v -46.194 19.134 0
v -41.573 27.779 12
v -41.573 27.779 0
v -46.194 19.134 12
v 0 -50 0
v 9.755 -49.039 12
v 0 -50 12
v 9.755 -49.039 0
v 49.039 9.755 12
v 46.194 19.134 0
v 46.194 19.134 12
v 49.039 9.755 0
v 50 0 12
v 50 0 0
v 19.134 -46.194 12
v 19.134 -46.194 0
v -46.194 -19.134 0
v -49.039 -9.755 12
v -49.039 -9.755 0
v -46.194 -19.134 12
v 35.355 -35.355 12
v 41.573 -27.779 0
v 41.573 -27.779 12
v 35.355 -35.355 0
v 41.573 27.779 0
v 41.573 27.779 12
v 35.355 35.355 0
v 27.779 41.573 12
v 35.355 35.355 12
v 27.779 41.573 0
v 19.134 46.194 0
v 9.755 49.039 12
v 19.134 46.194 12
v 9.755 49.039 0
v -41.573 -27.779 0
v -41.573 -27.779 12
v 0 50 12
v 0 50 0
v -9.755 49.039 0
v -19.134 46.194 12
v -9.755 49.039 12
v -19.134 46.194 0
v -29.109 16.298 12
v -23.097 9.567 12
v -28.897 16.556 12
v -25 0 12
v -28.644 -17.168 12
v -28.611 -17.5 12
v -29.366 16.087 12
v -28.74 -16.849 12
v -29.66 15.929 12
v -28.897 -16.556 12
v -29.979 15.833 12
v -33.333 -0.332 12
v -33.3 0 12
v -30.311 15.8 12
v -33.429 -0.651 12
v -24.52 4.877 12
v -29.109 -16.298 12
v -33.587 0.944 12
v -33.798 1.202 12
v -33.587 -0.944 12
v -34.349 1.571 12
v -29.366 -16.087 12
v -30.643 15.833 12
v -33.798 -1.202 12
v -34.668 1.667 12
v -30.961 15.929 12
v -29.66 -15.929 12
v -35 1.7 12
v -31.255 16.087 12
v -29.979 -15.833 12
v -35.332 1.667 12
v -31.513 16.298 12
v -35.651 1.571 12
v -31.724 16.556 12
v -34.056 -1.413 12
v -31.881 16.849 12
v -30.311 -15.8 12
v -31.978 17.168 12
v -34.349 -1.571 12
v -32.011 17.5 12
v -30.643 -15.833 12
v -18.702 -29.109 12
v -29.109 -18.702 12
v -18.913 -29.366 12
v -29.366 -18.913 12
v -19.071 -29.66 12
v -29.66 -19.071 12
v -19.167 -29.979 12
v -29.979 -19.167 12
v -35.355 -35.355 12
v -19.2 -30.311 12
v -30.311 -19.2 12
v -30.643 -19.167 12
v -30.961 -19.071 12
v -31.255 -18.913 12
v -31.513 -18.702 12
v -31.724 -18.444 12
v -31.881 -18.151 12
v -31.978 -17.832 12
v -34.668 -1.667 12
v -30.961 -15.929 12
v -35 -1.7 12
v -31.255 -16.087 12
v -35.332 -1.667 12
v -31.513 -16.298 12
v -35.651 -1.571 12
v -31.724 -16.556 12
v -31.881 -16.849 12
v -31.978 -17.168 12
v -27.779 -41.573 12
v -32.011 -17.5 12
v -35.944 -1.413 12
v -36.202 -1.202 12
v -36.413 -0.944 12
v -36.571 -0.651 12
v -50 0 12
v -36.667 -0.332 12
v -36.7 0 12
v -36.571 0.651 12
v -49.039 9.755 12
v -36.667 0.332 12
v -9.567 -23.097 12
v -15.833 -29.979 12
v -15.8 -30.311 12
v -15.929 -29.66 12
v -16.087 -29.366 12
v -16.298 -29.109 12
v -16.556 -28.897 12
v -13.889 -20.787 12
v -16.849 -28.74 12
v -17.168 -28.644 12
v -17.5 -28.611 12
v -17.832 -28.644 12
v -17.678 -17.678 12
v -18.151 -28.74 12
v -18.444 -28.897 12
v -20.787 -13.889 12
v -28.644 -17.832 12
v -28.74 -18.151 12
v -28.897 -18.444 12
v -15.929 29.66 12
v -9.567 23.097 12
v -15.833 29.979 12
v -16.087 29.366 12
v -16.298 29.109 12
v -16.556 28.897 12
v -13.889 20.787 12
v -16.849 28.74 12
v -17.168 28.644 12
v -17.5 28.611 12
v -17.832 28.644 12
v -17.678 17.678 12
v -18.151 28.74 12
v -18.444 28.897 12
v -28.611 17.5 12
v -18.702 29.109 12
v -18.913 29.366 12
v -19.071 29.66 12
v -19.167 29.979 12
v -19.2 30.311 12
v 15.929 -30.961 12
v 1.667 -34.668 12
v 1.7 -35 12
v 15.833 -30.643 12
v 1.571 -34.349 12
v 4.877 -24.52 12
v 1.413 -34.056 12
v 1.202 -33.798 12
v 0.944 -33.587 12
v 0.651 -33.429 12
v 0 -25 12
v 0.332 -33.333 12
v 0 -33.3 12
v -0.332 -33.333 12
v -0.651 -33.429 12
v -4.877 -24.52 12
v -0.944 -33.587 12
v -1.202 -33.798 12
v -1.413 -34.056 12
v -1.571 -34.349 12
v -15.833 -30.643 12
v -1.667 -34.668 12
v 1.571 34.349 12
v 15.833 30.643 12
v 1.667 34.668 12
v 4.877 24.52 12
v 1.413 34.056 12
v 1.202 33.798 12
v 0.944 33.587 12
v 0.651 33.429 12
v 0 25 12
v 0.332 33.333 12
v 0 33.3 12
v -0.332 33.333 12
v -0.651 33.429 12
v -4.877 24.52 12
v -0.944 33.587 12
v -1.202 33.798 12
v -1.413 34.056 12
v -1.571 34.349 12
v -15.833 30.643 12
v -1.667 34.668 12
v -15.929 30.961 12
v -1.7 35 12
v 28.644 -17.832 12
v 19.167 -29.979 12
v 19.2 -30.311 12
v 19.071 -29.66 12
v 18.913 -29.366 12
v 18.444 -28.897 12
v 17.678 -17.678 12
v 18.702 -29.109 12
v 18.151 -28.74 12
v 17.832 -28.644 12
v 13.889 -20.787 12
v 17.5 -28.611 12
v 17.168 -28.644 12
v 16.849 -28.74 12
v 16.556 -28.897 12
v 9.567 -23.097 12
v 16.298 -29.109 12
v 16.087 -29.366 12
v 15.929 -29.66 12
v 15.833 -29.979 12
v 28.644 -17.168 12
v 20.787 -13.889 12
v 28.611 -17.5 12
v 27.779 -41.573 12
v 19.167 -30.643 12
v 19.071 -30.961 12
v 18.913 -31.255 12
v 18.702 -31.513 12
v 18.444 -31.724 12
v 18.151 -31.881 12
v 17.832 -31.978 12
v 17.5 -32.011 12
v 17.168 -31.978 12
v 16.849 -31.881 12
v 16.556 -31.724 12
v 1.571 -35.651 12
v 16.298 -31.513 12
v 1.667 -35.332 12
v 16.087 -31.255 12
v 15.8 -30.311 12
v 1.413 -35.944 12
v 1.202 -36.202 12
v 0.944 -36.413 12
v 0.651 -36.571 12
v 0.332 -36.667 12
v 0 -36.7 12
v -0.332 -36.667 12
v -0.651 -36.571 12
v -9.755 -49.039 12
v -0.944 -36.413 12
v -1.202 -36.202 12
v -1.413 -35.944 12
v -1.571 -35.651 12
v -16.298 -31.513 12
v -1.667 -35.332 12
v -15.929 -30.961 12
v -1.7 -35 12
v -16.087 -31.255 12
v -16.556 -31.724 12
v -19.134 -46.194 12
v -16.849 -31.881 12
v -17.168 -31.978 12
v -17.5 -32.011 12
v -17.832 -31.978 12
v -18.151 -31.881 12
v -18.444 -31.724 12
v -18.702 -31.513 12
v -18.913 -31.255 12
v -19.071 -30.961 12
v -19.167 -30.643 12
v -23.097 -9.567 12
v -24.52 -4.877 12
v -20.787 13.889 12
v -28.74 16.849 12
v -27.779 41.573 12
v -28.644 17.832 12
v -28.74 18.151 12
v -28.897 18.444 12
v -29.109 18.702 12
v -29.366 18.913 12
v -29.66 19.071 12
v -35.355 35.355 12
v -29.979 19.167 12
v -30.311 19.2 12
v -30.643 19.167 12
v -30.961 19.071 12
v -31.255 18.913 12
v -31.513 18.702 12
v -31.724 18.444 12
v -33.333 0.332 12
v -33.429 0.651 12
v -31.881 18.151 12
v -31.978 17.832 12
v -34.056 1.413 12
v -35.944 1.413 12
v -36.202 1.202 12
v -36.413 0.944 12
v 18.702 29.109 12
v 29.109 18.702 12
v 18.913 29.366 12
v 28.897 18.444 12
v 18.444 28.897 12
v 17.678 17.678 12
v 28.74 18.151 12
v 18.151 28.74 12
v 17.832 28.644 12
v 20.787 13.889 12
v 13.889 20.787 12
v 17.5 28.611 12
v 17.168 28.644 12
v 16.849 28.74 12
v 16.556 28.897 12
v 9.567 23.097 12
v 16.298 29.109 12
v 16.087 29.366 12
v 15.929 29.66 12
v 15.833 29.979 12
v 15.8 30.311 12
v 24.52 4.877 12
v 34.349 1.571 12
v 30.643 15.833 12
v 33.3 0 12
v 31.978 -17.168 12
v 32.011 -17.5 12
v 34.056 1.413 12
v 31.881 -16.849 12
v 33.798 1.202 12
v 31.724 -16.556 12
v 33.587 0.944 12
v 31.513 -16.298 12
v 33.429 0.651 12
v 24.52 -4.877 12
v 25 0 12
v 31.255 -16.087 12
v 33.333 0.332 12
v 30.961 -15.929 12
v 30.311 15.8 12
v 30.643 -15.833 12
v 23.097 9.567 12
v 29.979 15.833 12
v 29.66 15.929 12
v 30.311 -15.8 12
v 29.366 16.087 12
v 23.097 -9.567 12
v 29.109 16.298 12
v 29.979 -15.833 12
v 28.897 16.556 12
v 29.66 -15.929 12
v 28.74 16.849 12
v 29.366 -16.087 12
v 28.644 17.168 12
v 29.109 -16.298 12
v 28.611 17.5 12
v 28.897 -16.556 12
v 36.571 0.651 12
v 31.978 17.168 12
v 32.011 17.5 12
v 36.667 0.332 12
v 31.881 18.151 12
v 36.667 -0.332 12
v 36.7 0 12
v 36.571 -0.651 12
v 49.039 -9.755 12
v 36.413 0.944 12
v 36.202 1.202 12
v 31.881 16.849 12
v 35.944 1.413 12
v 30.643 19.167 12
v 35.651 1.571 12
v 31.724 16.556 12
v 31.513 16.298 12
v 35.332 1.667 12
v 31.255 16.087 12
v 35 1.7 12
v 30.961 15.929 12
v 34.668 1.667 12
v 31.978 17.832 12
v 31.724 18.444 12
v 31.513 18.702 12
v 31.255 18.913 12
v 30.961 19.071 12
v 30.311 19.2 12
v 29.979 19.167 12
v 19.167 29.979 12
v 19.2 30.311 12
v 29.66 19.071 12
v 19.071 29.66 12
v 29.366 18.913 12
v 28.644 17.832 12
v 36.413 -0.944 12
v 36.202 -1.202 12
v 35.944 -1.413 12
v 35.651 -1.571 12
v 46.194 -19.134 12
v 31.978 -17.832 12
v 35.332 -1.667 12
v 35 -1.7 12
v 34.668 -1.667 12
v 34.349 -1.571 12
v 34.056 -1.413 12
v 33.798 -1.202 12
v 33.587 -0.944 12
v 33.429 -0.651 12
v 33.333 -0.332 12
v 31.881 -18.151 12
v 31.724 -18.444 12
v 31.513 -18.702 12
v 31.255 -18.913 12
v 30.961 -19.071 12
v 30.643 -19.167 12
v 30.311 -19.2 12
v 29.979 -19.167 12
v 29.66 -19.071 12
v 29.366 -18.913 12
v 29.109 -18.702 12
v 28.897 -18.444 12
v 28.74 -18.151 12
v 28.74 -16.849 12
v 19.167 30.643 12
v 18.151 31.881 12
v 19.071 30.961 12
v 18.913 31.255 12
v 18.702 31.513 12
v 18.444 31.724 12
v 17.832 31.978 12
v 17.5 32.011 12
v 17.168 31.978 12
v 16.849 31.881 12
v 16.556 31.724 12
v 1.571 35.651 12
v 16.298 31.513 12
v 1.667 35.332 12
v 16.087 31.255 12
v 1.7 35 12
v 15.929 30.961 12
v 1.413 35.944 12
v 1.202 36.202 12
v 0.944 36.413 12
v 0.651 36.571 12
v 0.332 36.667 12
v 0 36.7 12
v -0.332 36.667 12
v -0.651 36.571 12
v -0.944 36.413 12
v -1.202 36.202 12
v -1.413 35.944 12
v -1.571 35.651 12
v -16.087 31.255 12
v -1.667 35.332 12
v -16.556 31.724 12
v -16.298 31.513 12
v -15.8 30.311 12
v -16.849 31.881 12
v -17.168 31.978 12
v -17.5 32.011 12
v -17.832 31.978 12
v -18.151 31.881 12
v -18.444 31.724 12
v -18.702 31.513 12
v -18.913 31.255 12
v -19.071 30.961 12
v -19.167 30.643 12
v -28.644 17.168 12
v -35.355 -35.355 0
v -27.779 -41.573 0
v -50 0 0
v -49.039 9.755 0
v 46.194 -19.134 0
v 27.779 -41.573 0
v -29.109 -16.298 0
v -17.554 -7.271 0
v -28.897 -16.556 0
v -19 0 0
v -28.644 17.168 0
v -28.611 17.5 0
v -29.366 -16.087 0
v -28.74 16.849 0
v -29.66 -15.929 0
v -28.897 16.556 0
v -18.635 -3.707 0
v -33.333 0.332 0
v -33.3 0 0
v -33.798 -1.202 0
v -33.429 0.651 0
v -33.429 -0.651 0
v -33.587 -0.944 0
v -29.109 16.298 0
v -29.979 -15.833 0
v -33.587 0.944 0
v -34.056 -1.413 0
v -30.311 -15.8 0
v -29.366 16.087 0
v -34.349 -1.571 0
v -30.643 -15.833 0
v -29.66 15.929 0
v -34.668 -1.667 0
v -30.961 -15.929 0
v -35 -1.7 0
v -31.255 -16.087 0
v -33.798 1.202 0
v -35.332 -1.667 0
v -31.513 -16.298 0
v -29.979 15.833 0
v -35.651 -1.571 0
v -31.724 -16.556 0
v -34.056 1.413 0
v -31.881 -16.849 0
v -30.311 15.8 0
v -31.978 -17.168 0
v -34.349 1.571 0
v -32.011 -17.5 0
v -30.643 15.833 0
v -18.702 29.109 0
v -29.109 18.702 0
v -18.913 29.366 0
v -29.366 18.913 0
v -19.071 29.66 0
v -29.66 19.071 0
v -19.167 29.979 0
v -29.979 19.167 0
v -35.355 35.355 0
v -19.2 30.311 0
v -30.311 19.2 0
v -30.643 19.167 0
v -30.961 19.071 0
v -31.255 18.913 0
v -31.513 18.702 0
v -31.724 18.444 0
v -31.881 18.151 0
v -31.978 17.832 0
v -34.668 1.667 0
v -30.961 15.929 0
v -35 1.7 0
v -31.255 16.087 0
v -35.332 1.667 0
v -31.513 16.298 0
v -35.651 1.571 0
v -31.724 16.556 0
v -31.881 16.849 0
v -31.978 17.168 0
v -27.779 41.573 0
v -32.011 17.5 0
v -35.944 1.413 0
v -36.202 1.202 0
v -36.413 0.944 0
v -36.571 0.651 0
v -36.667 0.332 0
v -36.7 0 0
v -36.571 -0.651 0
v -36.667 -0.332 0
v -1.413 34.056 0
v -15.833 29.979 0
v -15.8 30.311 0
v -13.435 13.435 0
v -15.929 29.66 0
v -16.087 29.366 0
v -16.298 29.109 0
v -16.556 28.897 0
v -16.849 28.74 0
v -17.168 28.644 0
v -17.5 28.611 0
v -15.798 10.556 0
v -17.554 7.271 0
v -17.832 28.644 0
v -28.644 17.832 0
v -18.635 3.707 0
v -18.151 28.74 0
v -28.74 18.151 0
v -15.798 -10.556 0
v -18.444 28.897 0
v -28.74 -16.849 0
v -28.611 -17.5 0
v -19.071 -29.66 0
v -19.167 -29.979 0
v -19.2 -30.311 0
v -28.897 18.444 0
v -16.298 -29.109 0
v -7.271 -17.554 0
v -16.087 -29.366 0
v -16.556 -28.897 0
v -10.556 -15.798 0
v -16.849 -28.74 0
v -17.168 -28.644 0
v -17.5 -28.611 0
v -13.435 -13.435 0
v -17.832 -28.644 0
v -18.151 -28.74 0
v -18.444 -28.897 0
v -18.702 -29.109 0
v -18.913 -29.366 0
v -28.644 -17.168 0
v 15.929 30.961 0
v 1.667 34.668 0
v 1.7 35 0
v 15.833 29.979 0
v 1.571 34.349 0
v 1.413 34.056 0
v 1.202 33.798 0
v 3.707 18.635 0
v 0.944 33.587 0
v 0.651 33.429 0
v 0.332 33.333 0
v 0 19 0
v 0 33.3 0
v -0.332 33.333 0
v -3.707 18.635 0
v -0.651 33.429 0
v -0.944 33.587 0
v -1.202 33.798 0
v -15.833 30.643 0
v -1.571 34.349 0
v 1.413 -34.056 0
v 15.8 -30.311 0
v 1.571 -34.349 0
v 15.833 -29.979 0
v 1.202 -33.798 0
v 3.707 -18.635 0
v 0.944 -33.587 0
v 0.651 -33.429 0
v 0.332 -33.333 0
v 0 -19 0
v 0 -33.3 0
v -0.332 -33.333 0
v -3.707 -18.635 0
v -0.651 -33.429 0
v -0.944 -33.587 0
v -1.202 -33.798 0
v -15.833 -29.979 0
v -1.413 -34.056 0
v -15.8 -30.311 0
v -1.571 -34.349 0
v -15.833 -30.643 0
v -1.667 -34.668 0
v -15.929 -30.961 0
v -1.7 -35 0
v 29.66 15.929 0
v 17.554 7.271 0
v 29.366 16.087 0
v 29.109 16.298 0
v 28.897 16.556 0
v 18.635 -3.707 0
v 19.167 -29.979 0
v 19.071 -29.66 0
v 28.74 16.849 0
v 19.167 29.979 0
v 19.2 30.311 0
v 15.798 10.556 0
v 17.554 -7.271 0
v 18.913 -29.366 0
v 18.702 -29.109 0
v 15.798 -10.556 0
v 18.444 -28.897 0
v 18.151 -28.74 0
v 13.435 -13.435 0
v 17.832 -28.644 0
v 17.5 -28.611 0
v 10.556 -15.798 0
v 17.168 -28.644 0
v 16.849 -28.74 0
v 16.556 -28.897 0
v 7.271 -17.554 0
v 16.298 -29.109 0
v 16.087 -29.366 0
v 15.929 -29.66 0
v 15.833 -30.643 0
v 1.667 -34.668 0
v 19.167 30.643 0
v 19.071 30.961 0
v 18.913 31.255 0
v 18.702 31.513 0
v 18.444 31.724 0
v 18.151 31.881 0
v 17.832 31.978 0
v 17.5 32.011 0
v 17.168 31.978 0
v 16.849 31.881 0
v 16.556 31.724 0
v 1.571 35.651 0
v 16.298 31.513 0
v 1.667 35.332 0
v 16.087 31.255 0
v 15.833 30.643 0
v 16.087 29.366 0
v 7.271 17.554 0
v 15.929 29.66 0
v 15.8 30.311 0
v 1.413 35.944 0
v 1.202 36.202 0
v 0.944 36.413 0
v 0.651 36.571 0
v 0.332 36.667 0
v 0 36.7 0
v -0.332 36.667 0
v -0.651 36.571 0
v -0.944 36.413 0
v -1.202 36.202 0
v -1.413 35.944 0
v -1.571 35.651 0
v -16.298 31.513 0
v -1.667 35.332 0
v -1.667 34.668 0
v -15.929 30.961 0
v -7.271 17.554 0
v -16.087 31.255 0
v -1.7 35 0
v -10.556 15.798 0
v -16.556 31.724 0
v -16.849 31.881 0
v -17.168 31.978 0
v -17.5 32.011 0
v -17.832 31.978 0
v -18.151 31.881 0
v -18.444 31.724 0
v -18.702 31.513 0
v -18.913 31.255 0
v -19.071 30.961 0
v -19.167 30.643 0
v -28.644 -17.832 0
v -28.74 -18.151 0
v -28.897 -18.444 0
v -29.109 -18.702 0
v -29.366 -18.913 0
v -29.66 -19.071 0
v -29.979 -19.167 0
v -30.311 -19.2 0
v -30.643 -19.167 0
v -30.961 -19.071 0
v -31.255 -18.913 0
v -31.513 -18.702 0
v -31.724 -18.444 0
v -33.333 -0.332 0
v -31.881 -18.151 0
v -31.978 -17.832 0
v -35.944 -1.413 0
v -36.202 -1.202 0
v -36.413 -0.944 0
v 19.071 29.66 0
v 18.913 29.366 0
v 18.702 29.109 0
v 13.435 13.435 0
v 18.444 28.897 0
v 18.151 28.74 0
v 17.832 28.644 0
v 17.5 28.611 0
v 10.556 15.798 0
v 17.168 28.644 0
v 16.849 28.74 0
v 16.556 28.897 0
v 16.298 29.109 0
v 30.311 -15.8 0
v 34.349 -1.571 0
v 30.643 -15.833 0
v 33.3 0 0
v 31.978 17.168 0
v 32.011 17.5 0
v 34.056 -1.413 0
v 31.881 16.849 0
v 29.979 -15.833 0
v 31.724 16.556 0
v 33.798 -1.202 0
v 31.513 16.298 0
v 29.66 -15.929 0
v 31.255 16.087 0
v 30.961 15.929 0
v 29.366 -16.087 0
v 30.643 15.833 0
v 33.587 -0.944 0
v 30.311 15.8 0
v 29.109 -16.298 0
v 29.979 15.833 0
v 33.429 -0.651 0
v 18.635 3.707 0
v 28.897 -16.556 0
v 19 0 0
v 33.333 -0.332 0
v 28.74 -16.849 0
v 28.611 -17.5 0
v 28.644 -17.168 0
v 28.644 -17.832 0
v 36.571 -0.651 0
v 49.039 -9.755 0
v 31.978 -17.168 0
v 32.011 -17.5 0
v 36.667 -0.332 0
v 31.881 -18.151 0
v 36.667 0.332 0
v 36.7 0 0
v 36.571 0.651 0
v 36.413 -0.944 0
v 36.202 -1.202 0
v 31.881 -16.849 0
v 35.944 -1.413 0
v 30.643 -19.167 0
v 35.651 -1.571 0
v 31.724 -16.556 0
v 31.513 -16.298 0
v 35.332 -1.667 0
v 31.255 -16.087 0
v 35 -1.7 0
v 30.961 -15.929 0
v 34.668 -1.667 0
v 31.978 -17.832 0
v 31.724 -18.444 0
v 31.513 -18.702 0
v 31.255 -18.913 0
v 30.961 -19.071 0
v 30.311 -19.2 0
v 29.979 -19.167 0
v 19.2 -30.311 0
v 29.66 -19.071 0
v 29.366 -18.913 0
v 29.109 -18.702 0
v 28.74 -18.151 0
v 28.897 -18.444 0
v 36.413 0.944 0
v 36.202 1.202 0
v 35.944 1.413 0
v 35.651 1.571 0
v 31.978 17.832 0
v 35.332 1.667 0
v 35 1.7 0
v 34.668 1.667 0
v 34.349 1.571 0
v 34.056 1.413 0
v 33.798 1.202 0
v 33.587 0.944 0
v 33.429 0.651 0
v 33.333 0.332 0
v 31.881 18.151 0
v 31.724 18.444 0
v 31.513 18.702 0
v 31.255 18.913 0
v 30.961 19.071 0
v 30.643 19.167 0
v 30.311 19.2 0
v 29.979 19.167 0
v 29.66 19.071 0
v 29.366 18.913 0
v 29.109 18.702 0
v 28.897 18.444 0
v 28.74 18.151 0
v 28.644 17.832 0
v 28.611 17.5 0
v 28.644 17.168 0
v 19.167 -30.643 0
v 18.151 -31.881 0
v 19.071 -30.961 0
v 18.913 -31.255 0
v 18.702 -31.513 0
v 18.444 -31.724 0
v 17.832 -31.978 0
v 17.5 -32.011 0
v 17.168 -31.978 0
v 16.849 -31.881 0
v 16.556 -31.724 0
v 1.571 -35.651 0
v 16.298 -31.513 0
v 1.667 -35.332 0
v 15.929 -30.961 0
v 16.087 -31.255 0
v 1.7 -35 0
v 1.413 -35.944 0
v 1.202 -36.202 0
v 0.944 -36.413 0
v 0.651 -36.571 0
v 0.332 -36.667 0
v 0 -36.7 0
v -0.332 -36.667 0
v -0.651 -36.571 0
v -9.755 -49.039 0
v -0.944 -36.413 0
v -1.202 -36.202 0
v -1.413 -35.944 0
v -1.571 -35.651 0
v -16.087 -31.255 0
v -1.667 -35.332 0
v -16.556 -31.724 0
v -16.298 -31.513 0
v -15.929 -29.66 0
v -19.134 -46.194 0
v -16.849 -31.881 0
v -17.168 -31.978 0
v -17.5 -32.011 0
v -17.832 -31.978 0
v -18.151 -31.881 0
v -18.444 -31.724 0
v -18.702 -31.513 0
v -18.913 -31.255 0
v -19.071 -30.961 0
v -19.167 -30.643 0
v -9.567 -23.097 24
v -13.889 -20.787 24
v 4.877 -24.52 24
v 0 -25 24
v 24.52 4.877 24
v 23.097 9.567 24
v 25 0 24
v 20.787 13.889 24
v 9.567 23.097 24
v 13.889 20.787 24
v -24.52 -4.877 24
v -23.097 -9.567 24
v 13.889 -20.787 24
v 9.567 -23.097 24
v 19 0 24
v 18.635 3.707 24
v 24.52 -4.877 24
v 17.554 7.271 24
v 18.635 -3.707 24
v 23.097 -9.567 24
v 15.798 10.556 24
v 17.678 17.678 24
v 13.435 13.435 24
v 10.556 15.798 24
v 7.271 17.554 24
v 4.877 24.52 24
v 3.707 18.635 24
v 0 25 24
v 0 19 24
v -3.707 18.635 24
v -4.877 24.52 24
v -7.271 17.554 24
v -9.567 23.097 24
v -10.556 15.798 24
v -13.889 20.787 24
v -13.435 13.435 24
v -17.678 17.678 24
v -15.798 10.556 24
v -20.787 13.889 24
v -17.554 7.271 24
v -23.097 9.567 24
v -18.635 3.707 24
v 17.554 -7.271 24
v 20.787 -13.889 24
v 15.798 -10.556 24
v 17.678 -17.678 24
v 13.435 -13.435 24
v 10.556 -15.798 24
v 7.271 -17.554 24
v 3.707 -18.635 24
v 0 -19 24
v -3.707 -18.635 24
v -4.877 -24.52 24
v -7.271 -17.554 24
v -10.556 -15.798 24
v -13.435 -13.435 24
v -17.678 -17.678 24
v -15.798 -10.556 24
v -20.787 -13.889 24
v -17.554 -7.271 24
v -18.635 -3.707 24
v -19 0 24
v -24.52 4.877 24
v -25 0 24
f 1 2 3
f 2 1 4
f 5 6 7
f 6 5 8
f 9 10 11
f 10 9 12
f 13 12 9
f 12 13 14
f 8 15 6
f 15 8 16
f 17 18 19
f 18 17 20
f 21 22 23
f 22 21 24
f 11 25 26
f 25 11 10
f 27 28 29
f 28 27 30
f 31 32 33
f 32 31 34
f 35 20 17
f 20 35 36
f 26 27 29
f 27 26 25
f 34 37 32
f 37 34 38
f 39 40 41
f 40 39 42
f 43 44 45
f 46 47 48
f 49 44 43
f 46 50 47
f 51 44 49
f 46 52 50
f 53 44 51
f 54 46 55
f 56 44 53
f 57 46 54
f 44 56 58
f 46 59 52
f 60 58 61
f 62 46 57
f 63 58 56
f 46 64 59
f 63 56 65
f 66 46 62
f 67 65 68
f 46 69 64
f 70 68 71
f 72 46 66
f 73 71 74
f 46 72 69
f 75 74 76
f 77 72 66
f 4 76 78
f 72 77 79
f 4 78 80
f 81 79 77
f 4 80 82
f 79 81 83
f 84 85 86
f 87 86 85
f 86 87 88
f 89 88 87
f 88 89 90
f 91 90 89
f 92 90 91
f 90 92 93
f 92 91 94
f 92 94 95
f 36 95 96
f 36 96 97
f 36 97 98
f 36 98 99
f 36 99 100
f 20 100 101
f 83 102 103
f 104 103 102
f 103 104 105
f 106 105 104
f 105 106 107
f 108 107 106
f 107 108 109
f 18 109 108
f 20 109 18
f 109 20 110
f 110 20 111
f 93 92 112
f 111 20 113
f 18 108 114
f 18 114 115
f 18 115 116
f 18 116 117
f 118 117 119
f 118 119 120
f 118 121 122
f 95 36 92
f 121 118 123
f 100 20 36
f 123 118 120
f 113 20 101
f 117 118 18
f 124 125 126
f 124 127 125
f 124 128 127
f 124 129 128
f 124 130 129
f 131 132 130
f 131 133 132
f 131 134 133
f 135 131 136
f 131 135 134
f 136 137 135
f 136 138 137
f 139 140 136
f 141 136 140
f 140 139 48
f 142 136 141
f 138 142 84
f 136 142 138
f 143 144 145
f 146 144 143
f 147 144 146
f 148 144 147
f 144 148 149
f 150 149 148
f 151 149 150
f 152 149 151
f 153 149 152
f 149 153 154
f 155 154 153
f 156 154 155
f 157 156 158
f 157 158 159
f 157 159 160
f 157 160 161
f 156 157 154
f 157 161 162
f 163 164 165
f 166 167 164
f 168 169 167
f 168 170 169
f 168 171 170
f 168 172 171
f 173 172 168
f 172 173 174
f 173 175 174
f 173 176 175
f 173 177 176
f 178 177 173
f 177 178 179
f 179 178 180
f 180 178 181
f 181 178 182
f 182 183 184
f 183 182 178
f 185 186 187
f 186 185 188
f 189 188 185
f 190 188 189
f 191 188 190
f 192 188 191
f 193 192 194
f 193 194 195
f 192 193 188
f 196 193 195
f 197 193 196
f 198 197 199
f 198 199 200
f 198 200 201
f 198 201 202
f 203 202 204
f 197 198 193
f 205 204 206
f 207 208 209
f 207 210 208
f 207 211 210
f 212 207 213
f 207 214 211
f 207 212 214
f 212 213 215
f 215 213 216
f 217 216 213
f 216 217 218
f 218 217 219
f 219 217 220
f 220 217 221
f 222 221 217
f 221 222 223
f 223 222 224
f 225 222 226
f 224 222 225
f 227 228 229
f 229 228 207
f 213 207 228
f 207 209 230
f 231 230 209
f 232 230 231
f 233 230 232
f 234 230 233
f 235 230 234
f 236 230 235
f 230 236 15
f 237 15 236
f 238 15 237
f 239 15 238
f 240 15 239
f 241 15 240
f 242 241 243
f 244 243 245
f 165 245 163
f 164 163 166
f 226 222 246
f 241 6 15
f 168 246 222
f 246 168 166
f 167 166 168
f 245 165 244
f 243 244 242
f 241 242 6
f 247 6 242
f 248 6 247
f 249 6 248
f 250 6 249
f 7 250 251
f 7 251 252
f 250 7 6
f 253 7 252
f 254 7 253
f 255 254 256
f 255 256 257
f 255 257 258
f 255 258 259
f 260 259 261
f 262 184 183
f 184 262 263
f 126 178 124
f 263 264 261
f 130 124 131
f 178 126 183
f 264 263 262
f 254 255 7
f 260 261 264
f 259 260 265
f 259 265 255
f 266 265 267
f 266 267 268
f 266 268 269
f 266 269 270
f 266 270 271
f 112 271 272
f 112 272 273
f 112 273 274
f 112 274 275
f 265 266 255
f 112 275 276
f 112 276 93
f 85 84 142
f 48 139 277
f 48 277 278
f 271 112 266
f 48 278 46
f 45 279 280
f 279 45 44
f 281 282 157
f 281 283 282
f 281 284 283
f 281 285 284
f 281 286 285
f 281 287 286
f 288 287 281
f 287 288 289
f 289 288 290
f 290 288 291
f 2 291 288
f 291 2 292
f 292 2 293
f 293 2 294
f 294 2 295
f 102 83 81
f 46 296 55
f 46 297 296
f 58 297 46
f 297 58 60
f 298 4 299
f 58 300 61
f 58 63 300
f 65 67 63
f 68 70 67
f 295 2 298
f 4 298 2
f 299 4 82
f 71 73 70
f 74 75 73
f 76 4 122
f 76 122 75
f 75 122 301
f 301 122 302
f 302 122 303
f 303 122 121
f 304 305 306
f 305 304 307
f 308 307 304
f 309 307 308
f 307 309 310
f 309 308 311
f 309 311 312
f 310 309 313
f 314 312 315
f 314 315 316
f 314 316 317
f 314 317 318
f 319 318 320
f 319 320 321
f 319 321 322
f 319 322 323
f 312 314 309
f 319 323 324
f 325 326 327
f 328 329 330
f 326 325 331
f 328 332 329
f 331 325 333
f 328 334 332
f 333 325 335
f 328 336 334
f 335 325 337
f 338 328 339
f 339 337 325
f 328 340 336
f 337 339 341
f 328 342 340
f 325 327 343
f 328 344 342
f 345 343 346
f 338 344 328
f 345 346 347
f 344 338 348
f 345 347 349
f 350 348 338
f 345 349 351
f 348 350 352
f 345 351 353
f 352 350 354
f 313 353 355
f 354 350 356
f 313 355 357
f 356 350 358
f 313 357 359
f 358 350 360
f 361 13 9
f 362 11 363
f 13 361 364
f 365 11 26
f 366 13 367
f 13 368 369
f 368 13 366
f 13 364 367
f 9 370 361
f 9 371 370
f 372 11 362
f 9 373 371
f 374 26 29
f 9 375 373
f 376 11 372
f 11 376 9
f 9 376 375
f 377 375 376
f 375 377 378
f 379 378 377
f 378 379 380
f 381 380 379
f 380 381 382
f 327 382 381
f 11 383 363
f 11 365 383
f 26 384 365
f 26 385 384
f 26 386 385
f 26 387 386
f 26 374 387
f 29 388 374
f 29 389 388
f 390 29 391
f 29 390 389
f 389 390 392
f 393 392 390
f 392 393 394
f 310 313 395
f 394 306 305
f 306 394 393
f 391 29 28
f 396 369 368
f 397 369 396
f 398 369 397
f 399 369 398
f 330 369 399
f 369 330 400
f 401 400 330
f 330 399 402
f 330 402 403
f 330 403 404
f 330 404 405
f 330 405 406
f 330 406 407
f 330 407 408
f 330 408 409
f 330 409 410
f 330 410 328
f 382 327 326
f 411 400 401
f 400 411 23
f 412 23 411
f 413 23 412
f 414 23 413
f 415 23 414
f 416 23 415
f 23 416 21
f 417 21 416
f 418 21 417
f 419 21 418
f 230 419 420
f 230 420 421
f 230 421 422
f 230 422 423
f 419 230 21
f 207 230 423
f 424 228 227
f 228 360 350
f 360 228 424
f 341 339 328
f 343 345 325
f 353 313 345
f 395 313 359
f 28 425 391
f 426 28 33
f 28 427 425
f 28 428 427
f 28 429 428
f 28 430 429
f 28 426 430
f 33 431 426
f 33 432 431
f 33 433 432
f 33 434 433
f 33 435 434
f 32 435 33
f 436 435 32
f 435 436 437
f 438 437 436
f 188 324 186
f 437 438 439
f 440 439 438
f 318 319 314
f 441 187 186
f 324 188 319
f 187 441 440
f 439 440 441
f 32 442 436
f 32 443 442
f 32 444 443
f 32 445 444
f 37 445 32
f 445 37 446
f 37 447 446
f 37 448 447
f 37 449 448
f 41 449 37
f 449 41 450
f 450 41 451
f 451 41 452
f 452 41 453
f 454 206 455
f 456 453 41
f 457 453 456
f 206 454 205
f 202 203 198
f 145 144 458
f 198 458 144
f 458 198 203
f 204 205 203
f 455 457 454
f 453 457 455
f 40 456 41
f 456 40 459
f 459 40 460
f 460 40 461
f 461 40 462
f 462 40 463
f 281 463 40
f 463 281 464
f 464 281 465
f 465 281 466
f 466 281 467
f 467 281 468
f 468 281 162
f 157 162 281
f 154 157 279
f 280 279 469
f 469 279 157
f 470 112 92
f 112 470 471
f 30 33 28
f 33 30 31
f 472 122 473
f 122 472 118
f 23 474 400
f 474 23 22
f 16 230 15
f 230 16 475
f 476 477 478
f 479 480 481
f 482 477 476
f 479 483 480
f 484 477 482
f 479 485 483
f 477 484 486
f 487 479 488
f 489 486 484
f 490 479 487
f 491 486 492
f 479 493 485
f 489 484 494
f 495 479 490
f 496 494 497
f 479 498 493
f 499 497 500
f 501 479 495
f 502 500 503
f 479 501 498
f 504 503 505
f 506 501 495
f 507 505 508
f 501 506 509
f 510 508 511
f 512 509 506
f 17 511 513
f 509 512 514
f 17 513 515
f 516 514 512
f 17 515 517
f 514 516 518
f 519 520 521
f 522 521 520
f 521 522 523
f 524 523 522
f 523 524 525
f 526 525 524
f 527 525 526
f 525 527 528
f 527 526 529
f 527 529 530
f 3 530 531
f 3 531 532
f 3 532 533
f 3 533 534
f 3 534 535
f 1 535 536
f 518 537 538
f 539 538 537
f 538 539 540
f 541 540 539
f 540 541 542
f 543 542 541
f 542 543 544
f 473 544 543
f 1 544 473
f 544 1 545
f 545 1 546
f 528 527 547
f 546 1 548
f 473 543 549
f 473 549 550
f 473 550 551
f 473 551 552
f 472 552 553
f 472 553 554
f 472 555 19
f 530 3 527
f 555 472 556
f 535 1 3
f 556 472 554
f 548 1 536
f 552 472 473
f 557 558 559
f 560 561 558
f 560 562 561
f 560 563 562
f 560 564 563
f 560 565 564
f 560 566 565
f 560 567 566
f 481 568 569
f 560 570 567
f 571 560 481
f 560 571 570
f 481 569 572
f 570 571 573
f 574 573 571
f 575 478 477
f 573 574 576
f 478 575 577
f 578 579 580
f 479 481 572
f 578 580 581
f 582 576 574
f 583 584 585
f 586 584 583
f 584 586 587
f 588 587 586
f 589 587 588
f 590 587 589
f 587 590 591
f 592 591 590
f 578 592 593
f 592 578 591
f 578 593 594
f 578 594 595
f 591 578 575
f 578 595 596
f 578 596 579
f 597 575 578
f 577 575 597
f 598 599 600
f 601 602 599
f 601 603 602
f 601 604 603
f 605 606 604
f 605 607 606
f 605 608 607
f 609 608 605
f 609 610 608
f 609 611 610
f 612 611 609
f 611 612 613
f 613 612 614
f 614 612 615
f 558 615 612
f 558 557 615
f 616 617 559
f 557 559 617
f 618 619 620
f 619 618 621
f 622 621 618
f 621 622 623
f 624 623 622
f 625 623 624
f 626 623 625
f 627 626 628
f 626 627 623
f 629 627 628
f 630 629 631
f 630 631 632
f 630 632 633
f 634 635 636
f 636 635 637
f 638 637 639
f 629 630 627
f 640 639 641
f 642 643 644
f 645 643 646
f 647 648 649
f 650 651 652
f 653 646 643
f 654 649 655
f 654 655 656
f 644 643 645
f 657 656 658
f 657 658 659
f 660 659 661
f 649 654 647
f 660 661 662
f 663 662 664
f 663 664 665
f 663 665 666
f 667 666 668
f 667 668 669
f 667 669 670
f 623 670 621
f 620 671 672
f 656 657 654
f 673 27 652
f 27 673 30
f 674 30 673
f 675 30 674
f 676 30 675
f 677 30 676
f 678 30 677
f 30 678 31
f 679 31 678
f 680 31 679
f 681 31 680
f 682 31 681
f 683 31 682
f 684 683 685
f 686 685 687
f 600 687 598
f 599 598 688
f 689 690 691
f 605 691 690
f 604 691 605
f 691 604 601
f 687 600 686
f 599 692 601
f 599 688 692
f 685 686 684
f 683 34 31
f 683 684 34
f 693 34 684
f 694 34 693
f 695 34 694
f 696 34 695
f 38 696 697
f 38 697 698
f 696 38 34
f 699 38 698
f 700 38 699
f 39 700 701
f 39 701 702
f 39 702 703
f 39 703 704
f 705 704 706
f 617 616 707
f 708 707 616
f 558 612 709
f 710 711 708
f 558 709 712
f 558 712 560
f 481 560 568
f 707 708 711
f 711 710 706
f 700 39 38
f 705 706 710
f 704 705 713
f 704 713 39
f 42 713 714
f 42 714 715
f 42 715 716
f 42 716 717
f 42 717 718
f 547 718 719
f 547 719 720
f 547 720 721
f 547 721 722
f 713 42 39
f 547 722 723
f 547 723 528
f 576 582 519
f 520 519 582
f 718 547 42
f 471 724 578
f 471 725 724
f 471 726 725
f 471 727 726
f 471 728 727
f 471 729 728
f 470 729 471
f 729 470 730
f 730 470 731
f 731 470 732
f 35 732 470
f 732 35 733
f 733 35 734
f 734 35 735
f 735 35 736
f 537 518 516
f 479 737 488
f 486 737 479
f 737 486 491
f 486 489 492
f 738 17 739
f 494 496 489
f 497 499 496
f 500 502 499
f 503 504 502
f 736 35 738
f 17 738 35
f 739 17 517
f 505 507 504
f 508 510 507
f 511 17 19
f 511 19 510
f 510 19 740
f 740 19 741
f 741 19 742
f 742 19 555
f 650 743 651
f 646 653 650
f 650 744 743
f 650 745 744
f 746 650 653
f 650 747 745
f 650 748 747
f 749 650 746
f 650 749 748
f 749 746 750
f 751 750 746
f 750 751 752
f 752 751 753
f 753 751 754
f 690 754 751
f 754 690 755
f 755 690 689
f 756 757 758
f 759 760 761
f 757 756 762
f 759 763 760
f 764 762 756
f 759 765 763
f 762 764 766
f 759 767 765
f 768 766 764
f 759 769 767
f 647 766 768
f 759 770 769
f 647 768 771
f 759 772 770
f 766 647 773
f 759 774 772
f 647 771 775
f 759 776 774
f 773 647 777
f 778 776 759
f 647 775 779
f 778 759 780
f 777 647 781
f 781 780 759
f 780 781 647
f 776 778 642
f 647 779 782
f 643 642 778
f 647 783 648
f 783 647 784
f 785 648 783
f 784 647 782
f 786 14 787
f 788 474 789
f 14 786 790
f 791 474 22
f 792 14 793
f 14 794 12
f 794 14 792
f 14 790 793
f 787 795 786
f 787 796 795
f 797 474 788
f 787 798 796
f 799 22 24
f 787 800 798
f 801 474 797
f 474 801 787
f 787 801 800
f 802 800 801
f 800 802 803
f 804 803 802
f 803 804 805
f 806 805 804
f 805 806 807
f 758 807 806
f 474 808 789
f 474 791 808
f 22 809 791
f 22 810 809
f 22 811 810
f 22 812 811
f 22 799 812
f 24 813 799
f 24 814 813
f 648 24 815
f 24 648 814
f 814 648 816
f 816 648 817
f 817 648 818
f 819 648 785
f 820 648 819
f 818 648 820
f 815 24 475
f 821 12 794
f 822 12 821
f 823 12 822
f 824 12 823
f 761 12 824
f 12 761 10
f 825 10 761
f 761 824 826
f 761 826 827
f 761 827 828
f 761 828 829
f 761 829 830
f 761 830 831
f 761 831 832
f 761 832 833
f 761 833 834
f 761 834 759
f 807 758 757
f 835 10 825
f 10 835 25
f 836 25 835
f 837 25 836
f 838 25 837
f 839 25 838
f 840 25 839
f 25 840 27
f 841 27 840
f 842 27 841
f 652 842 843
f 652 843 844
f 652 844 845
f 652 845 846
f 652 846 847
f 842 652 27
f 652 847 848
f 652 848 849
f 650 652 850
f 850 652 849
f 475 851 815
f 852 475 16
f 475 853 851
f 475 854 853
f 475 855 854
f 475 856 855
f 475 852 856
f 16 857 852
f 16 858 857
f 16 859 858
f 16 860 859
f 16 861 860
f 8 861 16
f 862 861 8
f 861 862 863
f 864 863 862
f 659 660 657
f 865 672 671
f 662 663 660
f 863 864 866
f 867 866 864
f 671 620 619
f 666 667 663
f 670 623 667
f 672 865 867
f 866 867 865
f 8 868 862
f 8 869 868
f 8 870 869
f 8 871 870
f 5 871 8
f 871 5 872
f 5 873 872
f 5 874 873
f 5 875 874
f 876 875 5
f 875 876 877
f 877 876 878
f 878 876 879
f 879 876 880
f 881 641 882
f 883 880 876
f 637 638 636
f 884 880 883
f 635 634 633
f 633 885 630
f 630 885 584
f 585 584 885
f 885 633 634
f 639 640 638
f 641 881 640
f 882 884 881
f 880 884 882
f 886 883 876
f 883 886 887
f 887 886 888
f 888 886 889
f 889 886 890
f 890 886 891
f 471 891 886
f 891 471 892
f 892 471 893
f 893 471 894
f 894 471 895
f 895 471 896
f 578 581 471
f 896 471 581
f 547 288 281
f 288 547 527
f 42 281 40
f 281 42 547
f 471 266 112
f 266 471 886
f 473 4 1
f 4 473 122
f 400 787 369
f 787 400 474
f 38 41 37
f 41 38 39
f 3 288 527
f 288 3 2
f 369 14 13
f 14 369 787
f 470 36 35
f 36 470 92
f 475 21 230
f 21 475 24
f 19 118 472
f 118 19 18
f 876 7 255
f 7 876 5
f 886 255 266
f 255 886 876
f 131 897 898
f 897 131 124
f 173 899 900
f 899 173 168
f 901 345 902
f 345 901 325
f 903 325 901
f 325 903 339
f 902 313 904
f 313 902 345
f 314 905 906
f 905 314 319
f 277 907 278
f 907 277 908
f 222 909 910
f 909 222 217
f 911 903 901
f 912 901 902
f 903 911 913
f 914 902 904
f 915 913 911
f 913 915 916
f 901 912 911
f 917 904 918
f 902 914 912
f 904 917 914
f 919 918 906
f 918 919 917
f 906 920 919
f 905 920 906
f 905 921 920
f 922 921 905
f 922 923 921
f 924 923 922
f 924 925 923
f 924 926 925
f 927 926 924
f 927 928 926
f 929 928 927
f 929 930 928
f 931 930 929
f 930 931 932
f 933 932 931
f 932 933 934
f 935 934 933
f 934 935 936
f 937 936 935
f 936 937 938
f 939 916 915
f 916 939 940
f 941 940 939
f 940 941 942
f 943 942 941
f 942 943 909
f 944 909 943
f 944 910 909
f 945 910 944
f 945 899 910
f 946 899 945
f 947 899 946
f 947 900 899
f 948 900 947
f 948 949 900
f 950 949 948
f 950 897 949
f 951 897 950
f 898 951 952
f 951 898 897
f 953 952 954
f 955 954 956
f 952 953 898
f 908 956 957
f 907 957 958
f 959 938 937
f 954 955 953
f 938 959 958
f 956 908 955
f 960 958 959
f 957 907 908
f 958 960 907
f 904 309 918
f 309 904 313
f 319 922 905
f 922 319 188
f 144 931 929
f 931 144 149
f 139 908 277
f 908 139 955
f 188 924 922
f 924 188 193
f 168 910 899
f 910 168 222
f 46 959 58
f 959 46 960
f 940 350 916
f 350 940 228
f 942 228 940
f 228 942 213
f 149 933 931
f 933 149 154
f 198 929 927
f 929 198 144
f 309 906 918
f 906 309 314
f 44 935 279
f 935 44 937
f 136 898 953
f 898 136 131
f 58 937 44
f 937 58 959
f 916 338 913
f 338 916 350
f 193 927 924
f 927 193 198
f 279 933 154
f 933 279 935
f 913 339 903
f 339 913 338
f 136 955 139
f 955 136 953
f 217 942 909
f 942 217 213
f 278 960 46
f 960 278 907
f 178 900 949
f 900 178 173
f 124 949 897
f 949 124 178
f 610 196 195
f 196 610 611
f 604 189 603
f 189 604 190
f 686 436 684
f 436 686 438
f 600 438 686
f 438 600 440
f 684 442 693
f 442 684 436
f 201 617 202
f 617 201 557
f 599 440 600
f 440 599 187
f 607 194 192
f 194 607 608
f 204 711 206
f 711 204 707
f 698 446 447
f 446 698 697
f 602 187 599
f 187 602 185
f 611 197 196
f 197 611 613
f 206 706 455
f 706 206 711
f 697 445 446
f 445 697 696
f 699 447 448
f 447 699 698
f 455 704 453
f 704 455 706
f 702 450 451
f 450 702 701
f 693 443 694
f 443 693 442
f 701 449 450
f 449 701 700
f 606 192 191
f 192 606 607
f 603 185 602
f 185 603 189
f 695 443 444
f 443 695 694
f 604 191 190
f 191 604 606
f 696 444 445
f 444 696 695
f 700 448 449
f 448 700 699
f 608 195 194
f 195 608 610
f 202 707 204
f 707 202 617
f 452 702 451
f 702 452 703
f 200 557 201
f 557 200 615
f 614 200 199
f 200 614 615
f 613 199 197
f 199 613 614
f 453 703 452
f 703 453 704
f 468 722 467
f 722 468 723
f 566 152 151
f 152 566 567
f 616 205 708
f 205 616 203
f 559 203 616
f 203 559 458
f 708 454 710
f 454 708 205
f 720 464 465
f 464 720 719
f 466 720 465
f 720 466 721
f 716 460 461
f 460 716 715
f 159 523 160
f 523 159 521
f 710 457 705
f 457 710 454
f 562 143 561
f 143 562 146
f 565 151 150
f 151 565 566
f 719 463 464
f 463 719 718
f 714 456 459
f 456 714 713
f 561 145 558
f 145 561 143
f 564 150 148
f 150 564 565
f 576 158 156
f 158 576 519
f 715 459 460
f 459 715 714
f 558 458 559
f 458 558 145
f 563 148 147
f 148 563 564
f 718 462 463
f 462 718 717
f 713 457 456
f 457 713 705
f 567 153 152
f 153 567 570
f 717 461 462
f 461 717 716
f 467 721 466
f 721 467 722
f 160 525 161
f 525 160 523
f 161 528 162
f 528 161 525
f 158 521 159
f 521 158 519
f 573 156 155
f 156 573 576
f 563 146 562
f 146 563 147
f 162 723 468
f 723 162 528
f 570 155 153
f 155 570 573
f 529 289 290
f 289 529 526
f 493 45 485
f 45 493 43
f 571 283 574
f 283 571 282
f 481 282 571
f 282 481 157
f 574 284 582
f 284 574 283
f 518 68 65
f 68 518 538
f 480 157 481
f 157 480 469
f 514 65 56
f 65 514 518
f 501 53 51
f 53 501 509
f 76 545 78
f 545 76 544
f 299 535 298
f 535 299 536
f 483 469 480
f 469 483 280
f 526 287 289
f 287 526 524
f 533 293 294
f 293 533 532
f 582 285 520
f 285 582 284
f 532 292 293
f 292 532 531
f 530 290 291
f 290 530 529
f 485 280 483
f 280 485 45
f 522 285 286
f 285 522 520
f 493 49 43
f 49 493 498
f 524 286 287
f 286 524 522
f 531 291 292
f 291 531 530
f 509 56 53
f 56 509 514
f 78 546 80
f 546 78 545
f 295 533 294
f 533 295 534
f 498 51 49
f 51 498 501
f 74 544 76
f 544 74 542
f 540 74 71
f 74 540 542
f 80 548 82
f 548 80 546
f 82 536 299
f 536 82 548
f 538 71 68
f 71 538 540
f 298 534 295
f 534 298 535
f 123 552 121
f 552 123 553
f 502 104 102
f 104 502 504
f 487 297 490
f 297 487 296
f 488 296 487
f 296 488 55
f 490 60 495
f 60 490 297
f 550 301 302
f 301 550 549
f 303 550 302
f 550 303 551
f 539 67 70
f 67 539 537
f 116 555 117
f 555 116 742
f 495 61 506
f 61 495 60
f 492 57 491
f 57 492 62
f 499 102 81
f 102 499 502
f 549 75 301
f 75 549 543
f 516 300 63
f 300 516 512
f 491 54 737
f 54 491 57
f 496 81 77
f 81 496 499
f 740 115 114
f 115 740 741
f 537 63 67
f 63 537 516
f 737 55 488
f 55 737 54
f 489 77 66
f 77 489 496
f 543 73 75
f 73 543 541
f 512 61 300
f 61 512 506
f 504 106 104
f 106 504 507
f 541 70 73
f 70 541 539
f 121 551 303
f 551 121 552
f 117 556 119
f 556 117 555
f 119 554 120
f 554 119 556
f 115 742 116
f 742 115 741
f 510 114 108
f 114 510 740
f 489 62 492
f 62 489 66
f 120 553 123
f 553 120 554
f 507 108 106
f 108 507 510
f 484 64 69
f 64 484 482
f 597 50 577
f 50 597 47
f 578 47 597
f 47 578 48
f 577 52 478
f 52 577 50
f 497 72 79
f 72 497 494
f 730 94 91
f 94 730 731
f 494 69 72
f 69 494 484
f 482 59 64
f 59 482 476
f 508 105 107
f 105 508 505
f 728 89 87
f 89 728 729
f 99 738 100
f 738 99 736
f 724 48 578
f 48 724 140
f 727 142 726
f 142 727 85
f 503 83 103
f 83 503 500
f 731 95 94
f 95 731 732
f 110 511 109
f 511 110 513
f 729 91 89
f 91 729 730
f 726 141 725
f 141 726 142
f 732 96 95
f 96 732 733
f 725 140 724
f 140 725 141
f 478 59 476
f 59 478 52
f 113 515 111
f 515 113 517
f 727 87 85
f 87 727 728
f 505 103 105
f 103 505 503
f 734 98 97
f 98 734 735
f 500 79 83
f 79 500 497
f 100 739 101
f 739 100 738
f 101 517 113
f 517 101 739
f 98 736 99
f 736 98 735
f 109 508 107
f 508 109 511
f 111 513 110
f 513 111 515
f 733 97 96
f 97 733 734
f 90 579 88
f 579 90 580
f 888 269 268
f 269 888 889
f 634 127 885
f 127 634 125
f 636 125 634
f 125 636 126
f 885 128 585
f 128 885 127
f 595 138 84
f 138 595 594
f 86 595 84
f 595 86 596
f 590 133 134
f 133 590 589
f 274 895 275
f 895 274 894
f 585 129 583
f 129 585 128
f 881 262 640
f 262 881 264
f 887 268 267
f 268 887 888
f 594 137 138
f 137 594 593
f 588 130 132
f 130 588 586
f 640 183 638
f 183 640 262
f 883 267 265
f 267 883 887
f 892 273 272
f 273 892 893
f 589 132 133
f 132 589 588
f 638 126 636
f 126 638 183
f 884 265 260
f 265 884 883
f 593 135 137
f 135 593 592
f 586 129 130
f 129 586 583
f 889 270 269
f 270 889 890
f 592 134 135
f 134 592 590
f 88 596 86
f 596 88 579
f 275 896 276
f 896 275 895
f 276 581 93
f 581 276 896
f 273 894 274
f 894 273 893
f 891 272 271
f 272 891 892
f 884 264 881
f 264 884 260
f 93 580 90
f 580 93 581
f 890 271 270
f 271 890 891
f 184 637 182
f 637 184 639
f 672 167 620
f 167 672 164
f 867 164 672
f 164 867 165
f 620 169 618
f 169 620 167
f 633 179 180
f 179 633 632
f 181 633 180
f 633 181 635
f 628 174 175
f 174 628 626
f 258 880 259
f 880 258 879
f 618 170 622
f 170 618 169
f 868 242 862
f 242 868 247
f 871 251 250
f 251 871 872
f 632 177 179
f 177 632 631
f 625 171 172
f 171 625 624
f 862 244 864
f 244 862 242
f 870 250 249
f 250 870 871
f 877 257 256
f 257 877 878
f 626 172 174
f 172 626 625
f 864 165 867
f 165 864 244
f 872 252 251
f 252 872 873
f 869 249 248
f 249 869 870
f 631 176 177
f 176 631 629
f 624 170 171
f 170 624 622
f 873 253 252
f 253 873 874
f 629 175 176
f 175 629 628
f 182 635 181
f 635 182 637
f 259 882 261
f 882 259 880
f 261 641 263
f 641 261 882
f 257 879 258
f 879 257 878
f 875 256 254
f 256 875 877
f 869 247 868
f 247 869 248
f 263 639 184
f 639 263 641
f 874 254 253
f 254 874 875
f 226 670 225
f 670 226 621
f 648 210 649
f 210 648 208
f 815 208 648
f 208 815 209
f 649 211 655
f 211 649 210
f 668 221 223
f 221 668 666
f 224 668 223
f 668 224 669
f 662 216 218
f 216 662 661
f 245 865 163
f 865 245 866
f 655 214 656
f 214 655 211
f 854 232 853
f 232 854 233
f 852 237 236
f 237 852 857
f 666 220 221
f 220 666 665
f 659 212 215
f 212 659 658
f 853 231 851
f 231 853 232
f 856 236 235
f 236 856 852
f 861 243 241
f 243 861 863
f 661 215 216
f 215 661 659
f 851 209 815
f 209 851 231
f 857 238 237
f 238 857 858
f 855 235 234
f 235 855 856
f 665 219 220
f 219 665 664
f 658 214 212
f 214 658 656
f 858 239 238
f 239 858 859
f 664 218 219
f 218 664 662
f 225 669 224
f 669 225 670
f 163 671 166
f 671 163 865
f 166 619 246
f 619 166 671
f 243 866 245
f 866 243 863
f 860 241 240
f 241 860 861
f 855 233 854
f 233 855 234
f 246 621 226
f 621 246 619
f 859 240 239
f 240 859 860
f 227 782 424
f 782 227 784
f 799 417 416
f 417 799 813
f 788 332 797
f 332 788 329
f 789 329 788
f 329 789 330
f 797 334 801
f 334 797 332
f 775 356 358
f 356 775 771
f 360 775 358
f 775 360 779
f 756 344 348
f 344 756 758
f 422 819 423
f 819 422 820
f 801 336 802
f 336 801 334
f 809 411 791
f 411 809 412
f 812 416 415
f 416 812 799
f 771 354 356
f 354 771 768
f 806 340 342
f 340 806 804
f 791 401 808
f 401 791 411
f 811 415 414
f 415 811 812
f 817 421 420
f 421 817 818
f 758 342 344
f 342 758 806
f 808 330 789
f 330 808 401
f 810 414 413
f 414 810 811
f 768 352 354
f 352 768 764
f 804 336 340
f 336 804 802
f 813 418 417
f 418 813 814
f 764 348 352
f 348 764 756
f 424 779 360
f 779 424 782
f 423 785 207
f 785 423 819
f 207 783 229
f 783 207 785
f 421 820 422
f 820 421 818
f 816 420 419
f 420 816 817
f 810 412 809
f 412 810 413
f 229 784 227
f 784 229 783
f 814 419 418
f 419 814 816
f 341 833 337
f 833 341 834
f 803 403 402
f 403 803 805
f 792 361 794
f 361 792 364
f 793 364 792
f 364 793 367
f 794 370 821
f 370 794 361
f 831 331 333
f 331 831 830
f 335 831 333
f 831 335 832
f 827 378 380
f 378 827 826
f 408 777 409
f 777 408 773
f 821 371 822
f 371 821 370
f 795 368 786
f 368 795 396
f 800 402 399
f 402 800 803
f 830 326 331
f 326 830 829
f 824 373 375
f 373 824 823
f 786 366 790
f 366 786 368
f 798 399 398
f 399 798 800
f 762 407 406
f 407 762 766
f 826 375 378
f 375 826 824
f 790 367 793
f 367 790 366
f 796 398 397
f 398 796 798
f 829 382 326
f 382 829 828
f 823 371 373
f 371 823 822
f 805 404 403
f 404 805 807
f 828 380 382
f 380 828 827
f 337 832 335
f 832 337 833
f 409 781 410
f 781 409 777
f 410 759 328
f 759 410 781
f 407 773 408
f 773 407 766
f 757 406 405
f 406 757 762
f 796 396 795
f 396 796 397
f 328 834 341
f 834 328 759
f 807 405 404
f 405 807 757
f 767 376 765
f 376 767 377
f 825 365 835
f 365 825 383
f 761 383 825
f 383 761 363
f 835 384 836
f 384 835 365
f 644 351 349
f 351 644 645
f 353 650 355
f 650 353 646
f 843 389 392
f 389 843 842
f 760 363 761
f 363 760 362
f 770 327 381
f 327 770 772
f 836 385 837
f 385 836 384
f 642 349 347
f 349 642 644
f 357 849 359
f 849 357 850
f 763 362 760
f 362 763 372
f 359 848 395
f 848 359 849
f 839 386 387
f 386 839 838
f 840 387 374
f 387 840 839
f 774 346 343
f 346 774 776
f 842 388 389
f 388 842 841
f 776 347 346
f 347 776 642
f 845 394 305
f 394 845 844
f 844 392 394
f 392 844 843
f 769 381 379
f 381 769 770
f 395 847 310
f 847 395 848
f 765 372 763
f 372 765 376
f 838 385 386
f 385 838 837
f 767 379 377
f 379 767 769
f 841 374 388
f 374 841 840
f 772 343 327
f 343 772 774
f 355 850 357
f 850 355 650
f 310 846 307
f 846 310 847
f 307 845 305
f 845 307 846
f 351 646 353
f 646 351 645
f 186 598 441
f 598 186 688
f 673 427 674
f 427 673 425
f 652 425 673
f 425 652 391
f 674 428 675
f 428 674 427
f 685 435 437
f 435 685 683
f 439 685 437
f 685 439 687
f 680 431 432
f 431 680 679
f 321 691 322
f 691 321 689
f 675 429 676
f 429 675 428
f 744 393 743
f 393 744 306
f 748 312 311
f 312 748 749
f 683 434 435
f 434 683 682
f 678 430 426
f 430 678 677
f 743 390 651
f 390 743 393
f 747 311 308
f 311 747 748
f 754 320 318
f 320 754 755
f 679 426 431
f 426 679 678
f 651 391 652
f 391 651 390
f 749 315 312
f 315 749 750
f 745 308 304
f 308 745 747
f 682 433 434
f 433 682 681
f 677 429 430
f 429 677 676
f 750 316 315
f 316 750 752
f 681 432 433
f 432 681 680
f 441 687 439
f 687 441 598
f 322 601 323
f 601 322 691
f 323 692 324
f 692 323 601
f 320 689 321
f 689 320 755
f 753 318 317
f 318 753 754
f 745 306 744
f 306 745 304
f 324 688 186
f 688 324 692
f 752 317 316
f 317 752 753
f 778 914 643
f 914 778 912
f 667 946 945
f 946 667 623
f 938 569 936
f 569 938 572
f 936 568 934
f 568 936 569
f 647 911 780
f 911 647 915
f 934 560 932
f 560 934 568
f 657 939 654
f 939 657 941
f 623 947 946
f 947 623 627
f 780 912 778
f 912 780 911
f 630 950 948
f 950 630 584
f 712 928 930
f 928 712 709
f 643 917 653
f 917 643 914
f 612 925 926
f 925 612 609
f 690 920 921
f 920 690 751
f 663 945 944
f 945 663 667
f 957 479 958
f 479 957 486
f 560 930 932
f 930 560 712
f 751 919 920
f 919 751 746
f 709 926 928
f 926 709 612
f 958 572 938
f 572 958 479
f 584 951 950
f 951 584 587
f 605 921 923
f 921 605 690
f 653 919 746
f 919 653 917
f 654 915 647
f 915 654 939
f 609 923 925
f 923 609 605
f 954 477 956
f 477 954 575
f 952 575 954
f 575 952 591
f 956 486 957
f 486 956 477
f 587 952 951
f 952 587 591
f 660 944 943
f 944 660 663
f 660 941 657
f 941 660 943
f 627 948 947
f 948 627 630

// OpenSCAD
$fn = 32;

// ----------------------------------------------------------------------
// Flange Ø100 x 12
// 12 holes on a Ø70 bolt circle, bolted joints
// ----------------------------------------------------------------------

// --- parameters (mm) ---
flange_d = 100;  // outside diameter of the flange
thickness = 12;  // flange thickness
holes = 12;      // number of bolt holes
pcd = 70;        // bolt circle diameter
start_deg = 90;  // angle of the first hole, from +X
hole_d = 3.4;    // bolt hole diameter
bore_d = 38;     // central through bore
hub_d = 50;      // hub outside diameter
hub_h = 12;      // hub height above the flange face (0 = no hub)

// --- derived feature positions (mm) ---
height = thickness + hub_h;  // = 24   overall height of the part
pcd_r = pcd / 2;             // = 35   bolt circle radius
hole_step = 360 / holes;     // = 30   angular pitch
feature_centers = [
  [pcd_r * cos(start_deg + 0 * hole_step), pcd_r * sin(start_deg + 0 * hole_step)],
  [pcd_r * cos(start_deg + 1 * hole_step), pcd_r * sin(start_deg + 1 * hole_step)],
  [pcd_r * cos(start_deg + 2 * hole_step), pcd_r * sin(start_deg + 2 * hole_step)],
  [pcd_r * cos(start_deg + 3 * hole_step), pcd_r * sin(start_deg + 3 * hole_step)],
  [pcd_r * cos(start_deg + 4 * hole_step), pcd_r * sin(start_deg + 4 * hole_step)],
  [pcd_r * cos(start_deg + 5 * hole_step), pcd_r * sin(start_deg + 5 * hole_step)],
  [pcd_r * cos(start_deg + 6 * hole_step), pcd_r * sin(start_deg + 6 * hole_step)],
  [pcd_r * cos(start_deg + 7 * hole_step), pcd_r * sin(start_deg + 7 * hole_step)],
  [pcd_r * cos(start_deg + 8 * hole_step), pcd_r * sin(start_deg + 8 * hole_step)],
  [pcd_r * cos(start_deg + 9 * hole_step), pcd_r * sin(start_deg + 9 * hole_step)],
  [pcd_r * cos(start_deg + 10 * hole_step), pcd_r * sin(start_deg + 10 * hole_step)],
  [pcd_r * cos(start_deg + 11 * hole_step), pcd_r * sin(start_deg + 11 * hole_step)]
];   // bolt hole centres on the pitch circle

// flange disc, every hole and the bore cut straight through
difference() {
  union() {
    cylinder(d = flange_d, h = thickness);
    cylinder(d = hub_d, h = height);  // hub, overlapped into the flange
  }
  translate([0, 0, -1]) cylinder(d = bore_d, h = height + 2);  // bore, through
  for (centre = feature_centers)
    translate([centre[0], centre[1], -1]) cylinder(d = hole_d, h = thickness + 2);
}
